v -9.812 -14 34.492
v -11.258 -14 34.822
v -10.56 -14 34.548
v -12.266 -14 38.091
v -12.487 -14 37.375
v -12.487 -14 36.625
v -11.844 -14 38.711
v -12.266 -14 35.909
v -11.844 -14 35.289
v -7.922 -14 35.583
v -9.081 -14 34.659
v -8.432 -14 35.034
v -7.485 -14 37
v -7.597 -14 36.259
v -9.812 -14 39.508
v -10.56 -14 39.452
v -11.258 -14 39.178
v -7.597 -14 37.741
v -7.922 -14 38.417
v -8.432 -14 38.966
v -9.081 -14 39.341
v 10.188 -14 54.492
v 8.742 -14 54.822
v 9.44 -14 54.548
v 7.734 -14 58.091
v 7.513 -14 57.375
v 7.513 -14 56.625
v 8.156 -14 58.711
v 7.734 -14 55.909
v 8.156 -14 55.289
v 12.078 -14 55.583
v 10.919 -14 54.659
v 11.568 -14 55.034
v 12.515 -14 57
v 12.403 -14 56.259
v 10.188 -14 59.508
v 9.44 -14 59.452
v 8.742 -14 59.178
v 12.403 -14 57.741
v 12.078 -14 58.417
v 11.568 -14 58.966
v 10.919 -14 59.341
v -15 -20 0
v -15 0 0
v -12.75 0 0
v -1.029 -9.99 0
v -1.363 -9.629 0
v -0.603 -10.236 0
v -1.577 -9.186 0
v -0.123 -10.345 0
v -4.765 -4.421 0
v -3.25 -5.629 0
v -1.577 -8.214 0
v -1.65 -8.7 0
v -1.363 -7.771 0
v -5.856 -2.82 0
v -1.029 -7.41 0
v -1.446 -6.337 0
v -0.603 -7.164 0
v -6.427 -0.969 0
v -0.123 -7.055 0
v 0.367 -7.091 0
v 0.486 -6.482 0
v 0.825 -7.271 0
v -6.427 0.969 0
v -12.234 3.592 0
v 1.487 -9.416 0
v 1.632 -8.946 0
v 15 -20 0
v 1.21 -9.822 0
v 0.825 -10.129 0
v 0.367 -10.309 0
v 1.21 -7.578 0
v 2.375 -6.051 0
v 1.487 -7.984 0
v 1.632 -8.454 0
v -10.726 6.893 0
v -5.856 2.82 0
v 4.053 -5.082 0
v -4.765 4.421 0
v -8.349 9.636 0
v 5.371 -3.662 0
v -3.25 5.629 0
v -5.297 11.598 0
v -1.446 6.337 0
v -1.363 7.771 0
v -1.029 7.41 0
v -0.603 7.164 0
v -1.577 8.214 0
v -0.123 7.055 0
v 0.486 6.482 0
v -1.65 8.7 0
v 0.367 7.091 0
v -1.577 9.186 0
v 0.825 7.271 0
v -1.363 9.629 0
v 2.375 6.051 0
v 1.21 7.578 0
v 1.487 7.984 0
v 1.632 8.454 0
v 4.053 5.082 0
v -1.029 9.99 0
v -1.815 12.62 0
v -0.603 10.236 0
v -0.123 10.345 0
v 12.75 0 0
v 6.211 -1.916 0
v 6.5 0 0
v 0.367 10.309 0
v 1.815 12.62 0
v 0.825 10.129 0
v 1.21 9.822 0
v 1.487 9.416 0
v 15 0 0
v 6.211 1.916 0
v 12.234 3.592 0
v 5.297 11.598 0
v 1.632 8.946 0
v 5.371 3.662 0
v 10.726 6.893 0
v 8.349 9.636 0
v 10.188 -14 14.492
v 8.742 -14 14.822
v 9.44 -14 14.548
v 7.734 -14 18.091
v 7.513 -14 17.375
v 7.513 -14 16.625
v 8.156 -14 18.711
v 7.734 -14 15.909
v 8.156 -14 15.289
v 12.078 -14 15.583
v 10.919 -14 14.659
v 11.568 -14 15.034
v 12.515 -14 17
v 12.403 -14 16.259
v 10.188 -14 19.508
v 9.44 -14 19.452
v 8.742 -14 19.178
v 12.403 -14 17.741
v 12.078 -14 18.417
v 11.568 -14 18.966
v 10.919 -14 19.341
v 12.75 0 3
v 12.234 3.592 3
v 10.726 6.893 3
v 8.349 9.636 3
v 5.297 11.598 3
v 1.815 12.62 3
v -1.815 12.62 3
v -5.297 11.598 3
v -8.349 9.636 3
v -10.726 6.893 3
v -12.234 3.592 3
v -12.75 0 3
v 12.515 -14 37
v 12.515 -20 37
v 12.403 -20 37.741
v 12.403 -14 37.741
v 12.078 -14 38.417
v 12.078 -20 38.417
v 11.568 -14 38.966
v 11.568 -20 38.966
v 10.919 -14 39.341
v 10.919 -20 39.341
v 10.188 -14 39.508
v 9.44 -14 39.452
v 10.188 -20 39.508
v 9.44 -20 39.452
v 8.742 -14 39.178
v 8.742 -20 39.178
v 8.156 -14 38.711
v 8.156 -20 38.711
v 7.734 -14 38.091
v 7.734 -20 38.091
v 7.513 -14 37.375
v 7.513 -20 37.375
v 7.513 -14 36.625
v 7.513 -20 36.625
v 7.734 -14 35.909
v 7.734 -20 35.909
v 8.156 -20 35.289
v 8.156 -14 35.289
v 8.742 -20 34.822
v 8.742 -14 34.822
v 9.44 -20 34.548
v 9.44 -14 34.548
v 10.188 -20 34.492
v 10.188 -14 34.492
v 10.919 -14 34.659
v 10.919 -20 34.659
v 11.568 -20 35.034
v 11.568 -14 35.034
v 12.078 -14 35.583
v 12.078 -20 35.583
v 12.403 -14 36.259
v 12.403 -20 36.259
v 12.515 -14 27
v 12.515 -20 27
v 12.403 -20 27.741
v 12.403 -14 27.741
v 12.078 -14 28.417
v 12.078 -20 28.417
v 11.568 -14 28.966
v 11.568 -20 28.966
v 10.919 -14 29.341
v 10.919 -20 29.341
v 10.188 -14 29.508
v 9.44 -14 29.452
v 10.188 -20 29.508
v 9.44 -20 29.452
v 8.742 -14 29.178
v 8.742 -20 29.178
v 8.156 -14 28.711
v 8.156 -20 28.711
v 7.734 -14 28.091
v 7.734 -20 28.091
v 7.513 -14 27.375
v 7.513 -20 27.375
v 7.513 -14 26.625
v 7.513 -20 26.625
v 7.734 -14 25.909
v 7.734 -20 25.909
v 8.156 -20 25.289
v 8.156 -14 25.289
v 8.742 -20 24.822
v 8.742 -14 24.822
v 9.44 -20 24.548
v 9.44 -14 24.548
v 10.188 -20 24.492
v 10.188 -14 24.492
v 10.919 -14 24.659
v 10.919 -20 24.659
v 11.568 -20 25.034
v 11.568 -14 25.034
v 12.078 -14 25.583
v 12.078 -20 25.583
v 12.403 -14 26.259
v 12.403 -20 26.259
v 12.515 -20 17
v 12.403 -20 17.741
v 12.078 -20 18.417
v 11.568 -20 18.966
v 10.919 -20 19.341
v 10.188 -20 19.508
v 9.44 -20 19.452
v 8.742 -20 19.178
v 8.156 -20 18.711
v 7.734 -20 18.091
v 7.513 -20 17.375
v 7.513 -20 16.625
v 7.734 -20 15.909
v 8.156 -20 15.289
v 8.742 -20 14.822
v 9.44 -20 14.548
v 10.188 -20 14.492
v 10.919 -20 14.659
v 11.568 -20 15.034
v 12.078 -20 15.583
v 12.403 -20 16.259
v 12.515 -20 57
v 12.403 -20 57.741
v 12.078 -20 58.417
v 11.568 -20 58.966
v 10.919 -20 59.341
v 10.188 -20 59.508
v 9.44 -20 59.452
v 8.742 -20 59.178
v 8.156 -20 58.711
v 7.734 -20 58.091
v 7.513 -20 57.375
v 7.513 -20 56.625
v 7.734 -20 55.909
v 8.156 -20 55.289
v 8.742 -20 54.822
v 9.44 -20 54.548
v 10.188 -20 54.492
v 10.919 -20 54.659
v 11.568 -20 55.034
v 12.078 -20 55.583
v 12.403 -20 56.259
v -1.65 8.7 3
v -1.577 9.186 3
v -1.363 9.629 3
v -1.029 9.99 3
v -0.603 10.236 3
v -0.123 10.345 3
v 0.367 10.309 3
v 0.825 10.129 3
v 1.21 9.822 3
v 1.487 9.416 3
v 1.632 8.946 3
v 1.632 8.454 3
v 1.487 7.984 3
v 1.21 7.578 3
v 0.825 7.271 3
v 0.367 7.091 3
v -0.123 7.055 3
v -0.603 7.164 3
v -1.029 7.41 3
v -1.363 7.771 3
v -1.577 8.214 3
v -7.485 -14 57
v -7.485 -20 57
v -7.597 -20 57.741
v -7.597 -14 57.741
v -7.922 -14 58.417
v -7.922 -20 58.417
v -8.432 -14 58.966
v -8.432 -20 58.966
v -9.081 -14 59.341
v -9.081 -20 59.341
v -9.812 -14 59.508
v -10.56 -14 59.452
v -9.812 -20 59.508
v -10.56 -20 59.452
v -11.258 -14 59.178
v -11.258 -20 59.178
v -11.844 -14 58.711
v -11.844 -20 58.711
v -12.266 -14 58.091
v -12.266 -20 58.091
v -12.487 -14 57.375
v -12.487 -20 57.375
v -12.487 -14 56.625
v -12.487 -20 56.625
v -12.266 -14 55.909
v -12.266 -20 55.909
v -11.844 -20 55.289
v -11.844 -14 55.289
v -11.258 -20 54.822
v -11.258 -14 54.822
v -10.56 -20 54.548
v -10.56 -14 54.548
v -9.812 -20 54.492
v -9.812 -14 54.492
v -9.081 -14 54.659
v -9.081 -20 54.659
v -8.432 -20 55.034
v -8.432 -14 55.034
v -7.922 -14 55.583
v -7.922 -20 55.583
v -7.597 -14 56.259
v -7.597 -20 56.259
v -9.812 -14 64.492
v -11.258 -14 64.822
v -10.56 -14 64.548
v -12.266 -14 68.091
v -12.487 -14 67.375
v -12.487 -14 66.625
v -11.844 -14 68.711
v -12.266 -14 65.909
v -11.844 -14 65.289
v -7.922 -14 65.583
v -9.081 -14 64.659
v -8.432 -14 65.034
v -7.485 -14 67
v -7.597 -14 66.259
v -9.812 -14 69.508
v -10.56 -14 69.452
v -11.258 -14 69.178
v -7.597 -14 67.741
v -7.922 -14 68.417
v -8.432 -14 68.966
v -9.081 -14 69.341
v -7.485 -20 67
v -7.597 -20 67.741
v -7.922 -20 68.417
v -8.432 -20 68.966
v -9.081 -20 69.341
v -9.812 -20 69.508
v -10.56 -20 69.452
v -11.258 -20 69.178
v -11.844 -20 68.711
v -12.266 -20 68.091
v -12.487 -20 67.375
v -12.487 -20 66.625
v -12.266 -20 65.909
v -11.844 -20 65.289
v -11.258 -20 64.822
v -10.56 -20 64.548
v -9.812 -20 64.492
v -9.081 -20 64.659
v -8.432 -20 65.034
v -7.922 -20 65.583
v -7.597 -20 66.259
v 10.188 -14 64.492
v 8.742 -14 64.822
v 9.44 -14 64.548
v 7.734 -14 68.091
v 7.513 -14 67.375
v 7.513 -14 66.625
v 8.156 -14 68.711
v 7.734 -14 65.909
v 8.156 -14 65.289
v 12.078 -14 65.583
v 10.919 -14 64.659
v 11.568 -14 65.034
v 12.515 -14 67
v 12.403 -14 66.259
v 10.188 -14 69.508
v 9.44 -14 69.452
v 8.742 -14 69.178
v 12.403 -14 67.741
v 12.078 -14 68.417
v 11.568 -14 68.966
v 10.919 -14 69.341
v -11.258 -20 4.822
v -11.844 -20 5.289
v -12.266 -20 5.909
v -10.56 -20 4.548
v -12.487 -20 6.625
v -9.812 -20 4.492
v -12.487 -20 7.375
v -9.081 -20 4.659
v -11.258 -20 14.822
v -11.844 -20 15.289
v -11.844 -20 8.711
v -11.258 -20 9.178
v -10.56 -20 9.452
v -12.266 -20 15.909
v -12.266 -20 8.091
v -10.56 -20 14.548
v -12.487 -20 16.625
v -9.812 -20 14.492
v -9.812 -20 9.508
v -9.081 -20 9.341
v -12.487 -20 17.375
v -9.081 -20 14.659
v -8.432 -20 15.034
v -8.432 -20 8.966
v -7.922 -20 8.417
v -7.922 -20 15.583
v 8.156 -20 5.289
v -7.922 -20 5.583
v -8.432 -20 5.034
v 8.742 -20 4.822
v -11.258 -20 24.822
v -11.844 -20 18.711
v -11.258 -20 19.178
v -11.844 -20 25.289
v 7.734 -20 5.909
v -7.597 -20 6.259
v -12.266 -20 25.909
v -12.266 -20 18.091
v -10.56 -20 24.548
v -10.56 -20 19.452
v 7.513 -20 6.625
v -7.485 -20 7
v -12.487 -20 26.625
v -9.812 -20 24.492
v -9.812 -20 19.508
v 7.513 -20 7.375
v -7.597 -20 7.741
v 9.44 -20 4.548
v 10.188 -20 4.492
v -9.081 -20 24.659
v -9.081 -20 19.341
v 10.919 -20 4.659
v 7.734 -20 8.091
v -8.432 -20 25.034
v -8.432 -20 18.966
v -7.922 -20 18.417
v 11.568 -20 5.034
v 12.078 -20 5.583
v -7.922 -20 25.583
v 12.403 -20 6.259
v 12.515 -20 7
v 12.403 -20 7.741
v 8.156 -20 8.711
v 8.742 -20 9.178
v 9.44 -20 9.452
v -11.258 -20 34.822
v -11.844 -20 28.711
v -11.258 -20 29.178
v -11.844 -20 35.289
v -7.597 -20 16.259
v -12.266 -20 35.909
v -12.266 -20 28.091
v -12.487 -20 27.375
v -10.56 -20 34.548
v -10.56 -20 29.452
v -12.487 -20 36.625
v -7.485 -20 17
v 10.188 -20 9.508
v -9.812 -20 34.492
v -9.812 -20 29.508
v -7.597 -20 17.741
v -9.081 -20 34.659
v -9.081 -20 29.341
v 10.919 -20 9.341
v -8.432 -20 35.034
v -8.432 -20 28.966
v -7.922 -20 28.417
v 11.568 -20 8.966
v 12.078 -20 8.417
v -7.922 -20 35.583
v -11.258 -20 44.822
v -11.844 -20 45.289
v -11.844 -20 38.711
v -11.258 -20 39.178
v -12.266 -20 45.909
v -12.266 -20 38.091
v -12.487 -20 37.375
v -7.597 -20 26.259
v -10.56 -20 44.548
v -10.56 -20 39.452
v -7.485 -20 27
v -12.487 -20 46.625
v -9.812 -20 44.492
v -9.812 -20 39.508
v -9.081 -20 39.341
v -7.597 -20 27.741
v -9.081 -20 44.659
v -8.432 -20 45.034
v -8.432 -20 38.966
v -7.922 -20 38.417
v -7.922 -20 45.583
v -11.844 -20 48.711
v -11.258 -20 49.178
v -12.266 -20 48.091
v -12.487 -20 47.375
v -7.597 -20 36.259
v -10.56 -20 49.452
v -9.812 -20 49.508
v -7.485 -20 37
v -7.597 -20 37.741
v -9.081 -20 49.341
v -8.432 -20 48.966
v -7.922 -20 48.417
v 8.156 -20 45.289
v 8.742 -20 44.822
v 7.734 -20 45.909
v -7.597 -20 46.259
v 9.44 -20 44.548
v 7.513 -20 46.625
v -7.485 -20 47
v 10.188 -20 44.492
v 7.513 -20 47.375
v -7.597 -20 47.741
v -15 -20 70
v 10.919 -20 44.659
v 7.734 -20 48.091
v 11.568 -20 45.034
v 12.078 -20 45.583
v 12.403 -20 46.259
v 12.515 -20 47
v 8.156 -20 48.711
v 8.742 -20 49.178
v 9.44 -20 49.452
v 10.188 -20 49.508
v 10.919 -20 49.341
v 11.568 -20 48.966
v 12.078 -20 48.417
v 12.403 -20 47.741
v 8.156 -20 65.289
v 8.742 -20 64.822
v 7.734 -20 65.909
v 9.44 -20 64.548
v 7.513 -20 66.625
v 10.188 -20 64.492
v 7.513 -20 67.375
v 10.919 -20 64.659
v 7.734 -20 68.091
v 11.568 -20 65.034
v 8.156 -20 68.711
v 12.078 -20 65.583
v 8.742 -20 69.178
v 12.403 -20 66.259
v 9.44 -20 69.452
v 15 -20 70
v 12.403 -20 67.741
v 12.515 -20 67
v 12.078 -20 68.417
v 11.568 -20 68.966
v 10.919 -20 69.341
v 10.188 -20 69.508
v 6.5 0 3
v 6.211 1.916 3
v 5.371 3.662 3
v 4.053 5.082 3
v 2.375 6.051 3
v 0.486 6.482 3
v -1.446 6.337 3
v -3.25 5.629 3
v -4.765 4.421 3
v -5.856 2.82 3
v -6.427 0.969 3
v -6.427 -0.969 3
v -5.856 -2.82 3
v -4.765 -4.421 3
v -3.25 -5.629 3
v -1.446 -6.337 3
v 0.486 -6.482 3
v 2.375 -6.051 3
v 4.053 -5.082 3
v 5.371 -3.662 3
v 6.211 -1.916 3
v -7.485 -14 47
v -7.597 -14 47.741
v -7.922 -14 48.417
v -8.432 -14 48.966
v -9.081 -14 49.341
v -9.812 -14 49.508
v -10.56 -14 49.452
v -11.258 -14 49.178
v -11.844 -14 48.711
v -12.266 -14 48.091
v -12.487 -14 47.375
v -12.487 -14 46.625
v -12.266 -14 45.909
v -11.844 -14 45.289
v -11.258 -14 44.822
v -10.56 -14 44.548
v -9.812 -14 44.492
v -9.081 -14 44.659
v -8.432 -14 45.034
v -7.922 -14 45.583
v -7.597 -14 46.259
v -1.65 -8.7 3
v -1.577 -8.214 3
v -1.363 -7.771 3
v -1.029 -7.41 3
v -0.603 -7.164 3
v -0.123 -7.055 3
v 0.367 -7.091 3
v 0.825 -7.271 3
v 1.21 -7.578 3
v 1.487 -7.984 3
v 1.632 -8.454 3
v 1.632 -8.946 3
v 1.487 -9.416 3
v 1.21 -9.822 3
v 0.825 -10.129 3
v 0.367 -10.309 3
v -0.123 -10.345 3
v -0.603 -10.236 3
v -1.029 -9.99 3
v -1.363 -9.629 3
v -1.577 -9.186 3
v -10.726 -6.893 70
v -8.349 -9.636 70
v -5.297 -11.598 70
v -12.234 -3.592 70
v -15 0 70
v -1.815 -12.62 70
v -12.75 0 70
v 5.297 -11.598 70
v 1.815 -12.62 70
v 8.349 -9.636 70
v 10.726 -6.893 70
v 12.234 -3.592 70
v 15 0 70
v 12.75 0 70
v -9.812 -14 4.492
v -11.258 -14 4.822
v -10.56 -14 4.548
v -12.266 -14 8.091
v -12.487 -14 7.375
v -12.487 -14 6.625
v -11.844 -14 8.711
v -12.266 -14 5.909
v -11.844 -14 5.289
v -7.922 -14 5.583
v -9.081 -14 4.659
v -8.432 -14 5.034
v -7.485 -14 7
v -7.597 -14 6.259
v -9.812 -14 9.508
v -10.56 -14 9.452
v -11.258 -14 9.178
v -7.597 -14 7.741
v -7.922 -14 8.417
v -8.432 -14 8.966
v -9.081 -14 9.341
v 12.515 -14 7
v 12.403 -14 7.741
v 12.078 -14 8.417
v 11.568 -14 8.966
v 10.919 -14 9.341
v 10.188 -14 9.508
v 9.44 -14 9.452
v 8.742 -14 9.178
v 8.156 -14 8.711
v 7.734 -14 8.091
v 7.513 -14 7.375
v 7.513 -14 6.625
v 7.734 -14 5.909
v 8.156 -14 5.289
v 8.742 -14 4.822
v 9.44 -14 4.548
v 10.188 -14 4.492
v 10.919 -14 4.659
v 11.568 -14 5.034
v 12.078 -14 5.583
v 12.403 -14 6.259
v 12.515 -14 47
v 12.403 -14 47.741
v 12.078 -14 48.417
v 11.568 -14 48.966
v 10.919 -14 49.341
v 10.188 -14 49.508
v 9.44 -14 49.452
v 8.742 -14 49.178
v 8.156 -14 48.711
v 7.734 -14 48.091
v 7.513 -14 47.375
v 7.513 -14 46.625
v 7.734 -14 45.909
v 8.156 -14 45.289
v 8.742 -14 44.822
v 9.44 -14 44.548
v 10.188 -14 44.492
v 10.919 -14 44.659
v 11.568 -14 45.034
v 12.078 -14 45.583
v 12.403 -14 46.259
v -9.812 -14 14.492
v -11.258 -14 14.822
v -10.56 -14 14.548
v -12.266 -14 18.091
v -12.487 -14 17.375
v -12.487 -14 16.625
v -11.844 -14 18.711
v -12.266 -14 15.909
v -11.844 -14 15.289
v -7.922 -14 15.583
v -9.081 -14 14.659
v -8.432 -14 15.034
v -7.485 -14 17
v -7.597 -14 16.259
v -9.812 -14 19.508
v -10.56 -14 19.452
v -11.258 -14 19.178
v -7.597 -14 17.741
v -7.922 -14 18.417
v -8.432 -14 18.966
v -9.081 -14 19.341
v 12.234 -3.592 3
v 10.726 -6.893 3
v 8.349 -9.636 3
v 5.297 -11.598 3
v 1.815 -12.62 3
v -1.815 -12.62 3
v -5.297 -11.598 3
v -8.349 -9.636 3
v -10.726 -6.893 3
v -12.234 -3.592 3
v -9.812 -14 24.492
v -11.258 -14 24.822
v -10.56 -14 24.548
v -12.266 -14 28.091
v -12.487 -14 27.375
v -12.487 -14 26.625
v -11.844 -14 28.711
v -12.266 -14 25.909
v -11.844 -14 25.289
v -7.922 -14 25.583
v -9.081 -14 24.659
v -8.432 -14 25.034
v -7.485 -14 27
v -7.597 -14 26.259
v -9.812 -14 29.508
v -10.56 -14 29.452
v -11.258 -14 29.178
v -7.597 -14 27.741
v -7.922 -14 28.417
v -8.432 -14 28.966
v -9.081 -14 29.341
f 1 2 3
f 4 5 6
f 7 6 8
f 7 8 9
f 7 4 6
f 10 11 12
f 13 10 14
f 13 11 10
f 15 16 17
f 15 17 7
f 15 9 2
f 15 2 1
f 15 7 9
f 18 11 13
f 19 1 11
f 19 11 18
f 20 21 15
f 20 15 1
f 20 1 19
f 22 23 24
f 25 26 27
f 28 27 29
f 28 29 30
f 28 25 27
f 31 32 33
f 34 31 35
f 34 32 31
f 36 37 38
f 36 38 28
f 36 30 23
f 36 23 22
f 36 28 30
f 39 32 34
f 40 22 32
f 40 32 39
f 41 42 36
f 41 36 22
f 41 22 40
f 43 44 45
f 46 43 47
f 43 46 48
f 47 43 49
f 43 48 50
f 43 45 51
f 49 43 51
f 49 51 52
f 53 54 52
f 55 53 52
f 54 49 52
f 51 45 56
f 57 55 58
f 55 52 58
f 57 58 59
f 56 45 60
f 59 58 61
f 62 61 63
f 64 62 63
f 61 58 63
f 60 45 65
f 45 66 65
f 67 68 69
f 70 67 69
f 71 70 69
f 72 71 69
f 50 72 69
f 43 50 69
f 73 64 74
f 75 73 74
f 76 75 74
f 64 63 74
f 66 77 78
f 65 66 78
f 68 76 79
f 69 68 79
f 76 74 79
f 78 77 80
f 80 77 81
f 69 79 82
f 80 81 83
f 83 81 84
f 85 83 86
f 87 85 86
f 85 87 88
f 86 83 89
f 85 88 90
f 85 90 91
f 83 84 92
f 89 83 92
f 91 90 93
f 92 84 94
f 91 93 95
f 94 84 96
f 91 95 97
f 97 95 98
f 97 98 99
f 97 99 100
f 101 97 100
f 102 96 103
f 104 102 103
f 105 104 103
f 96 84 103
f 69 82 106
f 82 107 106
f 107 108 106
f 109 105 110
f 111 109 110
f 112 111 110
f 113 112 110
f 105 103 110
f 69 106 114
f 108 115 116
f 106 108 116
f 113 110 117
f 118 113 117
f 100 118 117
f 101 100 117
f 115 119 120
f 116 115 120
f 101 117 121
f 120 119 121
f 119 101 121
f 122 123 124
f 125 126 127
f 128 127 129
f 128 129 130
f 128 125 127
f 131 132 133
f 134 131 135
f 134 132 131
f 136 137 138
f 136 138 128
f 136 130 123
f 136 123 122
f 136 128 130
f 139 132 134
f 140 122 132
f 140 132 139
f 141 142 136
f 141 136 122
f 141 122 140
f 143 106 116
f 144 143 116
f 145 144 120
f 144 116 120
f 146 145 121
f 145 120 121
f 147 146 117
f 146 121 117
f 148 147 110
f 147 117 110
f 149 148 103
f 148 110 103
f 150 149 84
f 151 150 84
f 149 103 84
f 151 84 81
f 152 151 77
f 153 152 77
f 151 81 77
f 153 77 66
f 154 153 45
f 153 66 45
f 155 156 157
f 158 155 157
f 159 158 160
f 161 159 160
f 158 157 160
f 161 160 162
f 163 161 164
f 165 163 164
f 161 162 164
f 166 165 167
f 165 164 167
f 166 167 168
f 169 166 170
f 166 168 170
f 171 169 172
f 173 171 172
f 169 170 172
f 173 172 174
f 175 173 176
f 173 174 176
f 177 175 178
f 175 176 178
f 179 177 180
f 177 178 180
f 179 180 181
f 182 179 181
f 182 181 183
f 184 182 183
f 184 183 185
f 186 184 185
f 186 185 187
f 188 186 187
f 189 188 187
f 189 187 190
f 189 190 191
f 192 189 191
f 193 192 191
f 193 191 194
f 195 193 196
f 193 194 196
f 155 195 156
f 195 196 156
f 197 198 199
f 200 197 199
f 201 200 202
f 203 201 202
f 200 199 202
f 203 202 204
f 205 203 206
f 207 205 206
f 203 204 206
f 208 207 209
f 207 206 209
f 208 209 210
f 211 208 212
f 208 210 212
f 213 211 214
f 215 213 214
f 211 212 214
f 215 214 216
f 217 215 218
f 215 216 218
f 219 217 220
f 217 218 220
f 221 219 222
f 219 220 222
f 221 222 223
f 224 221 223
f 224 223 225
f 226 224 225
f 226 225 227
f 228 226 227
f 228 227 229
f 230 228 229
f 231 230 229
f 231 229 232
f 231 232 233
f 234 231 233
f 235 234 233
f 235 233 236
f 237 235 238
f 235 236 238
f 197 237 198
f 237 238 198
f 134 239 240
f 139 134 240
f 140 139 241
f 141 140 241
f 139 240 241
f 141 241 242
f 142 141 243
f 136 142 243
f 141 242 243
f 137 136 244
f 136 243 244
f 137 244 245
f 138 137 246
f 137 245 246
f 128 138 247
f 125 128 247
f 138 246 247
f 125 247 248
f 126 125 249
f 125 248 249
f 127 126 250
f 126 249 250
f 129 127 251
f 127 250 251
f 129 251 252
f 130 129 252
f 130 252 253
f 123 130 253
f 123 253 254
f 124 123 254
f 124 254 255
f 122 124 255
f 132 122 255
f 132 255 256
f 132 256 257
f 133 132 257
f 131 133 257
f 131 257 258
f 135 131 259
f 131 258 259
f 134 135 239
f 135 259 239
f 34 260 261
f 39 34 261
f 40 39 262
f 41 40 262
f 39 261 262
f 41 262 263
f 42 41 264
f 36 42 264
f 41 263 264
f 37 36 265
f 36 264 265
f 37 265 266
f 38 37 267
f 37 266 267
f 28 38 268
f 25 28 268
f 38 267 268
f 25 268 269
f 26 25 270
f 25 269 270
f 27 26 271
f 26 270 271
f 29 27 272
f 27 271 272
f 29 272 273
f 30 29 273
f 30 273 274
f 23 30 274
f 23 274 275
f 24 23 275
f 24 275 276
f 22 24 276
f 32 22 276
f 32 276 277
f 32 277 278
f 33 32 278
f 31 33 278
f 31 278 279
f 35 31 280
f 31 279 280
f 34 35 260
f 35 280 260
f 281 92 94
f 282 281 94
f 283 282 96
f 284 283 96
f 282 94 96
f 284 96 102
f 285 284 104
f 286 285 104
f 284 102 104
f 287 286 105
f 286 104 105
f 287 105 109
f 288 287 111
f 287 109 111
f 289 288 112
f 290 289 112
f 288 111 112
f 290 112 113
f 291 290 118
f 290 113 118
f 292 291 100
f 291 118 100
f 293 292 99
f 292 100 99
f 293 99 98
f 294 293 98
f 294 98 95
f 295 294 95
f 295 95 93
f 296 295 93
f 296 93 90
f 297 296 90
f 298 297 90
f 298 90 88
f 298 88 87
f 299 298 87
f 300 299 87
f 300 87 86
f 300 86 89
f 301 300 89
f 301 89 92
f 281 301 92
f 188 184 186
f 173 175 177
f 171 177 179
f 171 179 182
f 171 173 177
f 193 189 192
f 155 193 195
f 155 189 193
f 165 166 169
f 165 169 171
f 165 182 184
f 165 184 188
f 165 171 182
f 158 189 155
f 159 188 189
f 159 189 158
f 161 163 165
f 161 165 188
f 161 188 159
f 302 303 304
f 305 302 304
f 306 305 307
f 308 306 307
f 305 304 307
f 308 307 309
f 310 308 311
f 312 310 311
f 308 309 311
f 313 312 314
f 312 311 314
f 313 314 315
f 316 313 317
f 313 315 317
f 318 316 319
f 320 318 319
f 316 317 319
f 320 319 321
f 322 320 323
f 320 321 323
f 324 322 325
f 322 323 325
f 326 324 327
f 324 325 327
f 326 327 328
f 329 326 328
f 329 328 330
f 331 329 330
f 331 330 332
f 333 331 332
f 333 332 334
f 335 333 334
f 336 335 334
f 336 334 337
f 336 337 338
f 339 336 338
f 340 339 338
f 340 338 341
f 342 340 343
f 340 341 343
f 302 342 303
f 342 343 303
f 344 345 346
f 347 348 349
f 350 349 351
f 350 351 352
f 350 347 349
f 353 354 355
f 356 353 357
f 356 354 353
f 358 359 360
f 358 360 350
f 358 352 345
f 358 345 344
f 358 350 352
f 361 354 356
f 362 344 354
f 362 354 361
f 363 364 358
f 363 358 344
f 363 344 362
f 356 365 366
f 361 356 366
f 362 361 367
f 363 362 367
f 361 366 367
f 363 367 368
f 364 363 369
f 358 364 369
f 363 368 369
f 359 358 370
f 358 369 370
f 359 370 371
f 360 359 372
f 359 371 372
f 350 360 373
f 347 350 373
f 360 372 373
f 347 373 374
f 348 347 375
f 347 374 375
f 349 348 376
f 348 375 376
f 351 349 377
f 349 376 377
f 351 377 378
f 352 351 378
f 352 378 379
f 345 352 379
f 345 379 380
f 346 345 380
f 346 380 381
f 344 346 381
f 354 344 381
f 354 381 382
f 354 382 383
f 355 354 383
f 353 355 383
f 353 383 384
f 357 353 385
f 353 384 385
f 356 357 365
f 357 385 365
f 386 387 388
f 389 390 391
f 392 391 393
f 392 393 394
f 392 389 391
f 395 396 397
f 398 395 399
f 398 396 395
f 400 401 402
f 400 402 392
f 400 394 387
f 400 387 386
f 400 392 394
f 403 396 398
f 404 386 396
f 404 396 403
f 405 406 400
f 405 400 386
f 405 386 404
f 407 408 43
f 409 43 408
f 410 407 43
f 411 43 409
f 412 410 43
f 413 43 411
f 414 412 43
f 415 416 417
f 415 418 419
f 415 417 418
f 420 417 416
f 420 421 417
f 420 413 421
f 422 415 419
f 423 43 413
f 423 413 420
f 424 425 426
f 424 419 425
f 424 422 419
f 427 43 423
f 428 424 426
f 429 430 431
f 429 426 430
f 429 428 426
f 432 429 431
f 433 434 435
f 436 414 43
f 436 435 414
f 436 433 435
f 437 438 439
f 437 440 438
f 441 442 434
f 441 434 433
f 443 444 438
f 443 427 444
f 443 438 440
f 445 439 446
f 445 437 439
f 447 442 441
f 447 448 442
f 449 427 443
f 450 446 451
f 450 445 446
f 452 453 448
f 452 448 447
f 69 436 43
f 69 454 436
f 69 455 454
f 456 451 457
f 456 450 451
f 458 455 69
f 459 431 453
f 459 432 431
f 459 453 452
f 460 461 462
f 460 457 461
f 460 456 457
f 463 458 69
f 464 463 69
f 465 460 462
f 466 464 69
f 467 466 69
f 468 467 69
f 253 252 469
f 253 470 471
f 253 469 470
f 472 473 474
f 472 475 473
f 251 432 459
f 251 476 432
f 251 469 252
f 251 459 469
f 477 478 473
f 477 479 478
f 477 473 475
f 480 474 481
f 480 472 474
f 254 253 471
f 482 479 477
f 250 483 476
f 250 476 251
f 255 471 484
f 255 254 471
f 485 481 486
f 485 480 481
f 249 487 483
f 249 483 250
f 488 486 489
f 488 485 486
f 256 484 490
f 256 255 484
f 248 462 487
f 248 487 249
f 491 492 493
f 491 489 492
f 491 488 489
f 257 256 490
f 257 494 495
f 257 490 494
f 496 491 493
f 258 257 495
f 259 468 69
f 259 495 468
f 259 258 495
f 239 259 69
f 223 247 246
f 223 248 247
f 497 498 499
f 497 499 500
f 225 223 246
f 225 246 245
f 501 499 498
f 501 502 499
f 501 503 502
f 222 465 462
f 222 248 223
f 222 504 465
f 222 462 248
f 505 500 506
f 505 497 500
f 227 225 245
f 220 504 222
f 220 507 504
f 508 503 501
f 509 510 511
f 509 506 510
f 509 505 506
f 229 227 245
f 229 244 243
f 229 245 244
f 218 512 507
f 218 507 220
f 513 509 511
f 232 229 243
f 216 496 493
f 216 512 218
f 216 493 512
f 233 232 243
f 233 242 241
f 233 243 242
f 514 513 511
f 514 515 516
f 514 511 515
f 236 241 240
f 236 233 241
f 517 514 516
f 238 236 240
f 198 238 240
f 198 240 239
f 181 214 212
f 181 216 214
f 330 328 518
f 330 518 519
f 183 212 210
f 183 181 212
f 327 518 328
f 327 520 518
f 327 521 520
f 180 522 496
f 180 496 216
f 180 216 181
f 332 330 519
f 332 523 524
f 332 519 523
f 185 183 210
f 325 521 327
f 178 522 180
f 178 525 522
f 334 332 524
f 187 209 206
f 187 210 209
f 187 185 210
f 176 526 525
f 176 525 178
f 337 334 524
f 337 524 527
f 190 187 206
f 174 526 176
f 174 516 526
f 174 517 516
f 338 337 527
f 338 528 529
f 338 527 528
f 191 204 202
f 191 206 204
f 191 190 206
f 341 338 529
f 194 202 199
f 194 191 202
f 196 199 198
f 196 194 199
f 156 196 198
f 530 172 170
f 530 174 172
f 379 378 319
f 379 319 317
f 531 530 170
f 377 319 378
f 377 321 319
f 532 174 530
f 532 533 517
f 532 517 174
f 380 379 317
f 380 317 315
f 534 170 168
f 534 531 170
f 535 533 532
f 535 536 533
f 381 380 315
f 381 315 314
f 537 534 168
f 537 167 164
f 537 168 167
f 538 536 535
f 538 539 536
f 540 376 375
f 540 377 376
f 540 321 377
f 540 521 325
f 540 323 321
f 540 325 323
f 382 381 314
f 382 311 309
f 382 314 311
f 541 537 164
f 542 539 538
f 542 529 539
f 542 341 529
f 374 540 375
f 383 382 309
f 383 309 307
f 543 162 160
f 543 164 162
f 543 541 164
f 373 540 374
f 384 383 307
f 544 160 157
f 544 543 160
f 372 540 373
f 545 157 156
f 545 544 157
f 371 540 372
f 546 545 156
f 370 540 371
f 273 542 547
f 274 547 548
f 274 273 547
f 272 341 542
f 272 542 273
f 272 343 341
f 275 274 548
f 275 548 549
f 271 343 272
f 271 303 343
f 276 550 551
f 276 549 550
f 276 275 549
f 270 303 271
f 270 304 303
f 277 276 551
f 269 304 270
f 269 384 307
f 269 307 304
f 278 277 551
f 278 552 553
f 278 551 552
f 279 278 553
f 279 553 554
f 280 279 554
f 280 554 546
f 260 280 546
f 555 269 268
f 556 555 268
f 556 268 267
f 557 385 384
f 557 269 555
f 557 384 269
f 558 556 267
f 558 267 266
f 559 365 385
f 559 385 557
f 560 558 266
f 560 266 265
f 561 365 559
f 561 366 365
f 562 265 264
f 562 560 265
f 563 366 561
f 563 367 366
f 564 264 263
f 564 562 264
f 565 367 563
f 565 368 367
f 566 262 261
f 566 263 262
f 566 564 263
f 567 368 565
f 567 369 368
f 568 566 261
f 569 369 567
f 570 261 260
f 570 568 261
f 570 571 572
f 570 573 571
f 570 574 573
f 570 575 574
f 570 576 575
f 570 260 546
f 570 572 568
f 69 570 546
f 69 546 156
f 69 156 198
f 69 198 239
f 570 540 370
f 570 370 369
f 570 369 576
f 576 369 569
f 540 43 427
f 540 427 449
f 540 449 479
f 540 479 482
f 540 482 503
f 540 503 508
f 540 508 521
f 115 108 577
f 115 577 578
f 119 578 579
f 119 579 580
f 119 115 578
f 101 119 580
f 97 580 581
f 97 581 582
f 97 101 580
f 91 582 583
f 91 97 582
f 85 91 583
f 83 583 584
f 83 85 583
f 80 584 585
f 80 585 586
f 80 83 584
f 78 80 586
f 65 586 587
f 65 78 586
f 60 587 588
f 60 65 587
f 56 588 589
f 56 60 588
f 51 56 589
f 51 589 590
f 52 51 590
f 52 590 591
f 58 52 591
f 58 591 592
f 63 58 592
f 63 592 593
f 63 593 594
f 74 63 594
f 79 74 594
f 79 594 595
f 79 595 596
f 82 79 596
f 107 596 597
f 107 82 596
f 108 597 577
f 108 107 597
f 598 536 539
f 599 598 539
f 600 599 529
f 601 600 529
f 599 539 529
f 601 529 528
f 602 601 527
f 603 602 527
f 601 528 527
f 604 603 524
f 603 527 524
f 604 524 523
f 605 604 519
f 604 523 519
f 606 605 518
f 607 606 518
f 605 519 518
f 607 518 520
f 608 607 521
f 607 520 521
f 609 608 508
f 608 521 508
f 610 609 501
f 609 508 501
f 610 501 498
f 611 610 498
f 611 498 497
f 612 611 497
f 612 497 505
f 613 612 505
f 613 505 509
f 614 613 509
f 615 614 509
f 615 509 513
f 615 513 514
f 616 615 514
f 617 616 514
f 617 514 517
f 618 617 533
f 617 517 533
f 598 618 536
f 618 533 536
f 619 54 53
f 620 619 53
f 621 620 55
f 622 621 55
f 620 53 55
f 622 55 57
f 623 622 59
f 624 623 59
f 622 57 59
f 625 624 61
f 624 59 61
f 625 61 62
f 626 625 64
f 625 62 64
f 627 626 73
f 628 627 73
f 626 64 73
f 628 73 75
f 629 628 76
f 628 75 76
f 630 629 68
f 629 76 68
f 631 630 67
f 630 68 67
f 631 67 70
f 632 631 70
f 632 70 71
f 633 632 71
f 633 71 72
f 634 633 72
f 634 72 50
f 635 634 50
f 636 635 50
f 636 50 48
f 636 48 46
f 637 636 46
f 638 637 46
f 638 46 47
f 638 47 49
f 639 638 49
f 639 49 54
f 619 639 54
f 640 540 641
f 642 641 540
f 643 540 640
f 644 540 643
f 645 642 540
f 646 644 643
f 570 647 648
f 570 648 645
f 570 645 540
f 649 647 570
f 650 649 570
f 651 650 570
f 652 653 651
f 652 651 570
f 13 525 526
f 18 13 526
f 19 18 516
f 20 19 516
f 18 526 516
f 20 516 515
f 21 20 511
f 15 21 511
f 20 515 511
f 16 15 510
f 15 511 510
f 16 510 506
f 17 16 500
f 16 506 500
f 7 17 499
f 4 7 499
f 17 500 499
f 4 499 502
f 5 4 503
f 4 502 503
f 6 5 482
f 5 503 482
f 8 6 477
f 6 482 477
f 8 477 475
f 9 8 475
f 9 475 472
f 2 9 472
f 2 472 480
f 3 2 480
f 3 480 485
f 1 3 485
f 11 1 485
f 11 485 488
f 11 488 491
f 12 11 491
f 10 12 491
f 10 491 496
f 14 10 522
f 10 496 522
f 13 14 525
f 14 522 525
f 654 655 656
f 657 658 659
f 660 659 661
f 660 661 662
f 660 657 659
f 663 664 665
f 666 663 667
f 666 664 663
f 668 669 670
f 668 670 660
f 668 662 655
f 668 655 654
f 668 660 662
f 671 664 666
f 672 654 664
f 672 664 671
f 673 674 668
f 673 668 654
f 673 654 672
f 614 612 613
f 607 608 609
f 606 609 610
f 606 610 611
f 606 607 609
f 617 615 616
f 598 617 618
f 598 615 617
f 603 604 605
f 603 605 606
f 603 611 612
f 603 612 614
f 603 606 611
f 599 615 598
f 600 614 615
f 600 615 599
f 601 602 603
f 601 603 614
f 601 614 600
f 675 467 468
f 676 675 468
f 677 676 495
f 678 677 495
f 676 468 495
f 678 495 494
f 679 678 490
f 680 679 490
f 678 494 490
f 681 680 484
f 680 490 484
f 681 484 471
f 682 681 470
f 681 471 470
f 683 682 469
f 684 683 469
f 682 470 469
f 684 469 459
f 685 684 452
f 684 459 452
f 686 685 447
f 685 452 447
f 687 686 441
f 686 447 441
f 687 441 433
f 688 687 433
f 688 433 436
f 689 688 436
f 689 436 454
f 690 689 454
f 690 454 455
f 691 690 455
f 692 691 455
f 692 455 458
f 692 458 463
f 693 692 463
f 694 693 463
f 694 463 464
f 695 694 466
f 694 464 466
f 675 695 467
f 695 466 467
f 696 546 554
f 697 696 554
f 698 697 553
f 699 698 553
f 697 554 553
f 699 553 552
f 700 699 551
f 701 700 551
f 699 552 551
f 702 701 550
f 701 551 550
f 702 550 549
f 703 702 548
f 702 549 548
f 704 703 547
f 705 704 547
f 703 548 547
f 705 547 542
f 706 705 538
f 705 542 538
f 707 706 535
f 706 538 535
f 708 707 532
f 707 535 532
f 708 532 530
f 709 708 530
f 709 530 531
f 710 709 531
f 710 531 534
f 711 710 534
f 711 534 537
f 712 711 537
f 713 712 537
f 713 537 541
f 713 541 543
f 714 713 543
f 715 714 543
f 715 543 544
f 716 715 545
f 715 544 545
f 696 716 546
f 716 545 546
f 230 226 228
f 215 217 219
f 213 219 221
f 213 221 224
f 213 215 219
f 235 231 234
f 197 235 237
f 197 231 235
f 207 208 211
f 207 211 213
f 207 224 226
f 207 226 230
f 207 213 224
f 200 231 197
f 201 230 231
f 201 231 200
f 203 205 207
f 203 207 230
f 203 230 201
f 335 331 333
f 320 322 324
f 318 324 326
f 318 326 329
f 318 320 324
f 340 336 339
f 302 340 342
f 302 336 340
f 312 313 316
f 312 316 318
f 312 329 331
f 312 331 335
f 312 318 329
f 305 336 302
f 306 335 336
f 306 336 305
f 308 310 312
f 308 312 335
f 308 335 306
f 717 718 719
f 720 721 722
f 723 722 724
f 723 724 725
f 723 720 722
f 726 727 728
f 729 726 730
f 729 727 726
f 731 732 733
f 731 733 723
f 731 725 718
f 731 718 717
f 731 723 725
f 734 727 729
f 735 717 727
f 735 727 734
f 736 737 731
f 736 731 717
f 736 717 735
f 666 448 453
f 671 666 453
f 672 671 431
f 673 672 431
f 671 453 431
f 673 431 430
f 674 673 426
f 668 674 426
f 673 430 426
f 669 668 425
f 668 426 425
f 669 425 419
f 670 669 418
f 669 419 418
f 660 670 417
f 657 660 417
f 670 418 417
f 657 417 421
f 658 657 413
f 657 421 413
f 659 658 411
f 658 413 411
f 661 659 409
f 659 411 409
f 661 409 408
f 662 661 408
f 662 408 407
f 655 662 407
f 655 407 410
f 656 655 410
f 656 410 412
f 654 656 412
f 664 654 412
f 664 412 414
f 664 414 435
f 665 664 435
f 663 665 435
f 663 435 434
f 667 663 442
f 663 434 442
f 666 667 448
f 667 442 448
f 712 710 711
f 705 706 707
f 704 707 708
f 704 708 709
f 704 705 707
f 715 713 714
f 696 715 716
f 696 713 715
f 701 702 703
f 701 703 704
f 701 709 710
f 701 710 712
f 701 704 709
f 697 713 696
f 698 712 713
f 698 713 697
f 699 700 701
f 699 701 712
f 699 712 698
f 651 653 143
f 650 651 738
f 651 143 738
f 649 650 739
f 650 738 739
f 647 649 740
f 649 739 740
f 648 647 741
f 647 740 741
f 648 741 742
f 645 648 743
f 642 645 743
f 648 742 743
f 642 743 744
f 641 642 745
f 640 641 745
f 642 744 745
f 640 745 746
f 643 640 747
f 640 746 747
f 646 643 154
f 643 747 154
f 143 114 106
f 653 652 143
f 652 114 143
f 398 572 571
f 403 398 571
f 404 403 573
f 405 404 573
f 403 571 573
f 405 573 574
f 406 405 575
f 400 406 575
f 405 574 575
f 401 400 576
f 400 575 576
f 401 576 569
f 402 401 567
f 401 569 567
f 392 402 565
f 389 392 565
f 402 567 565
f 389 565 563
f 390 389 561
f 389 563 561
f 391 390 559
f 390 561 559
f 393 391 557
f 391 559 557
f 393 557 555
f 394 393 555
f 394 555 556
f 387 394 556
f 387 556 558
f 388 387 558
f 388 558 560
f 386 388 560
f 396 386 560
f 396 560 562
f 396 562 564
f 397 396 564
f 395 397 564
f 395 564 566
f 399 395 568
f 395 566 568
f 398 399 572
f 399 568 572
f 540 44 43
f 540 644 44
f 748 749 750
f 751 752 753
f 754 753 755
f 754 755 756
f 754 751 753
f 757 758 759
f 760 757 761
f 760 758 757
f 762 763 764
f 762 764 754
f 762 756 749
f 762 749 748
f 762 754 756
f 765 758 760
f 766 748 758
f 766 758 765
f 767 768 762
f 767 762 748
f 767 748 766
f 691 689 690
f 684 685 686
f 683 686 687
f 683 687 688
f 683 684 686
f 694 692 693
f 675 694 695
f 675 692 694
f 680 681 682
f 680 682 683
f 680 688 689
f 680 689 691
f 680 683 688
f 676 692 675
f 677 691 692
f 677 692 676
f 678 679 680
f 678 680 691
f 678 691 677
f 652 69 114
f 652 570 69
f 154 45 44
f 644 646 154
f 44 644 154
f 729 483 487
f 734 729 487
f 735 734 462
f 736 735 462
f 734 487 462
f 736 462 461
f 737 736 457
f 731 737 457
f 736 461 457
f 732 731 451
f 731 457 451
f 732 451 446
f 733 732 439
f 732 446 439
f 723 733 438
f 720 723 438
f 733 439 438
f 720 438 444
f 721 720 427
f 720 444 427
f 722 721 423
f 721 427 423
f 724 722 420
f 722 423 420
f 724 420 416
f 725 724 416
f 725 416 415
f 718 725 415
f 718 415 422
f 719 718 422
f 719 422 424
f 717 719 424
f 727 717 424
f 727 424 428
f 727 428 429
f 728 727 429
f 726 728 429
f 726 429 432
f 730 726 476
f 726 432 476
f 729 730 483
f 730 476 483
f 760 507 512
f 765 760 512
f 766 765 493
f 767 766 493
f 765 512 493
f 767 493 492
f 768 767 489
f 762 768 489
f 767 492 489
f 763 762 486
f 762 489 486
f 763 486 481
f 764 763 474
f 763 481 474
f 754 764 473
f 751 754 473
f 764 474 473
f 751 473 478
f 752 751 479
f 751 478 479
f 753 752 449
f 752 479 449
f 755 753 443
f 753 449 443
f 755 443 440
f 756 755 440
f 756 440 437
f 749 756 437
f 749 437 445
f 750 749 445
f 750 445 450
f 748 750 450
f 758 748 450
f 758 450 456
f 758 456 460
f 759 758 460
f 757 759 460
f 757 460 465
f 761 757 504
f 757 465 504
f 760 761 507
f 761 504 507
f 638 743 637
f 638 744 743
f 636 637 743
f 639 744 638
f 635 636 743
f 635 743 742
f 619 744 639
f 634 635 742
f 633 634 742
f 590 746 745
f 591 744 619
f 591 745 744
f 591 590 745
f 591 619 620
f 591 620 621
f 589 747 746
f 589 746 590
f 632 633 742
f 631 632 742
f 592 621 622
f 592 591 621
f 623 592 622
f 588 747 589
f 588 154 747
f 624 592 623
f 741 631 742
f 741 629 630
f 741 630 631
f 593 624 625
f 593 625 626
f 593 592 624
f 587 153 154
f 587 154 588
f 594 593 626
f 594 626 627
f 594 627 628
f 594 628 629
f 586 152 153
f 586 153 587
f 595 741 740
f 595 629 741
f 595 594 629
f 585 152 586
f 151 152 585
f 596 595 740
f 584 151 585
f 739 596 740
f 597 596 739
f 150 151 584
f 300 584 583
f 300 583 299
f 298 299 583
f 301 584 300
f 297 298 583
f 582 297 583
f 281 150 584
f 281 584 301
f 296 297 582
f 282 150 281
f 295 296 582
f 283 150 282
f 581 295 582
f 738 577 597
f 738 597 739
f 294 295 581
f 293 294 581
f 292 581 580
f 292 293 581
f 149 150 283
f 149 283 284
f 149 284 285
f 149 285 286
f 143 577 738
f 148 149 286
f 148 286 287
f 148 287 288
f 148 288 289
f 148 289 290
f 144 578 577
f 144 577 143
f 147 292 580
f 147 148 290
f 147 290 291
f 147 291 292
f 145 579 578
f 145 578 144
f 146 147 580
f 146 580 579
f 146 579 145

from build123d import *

# Parameters (mm, degrees)
SKETCH1_R                = 12.75
SKETCH1_R_2              = 6.5
BOSS_EXTRUDE1_DEPTH      = 3
BOSS_EXTRUDE2_DEPTH      = 67
BOSS_EXTRUDE2_DEPTH_BACK = 3
SKETCH4_R                = 2.515
CUT_EXTRUDE1_DEPTH       = 6
LPATTERN1_COUNT          = 2
LPATTERN1_PITCH          = 20
LPATTERN1_COUNT_DIR2     = 7
LPATTERN1_PITCH_DIR2     = 10
SKETCH5_R                = 1.65
CUT_EXTRUDE2_DEPTH       = 75


with BuildPart() as part:
    # Sketch1 → Boss-Extrude1 (new body)
    with BuildSketch(Plane.XY):
        Circle(SKETCH1_R)
        Circle(SKETCH1_R_2, mode=Mode.SUBTRACT)
    extrude(amount=BOSS_EXTRUDE1_DEPTH)

    # Sketch2 → Boss-Extrude2 (add, two sides)
    with BuildSketch(Plane.XY.offset(3)) as boss_extrude2_sk:
        with BuildLine():
            Line((15, -20), (15, 0))
            Line((15, 0), (12.75, 0))
            ThreePointArc((12.75, 0), (0, -12.75), (-12.75, 0))
            Line((-12.75, 0), (-15, 0))
            Line((-15, 0), (-15, -20))
            Line((-15, -20), (15, -20))
        make_face()
    extrude(amount=BOSS_EXTRUDE2_DEPTH)
    extrude(boss_extrude2_sk.sketch, amount=-BOSS_EXTRUDE2_DEPTH_BACK)

    # Sketch4 → Cut-Extrude1 (cut)
    with BuildSketch(Plane.XZ.offset(20)):
        with Locations((-10, 67)):
            Circle(SKETCH4_R)
    cut_extrude1 = extrude(amount=-CUT_EXTRUDE1_DEPTH, mode=Mode.SUBTRACT)

    # LPattern1: Cut-Extrude1 2 × 7
    with Locations(*[(i * LPATTERN1_PITCH, 0, -j * LPATTERN1_PITCH_DIR2) for i in range(LPATTERN1_COUNT) for j in range(LPATTERN1_COUNT_DIR2) if (i, j) != (0, 0)]):
        add(cut_extrude1, mode=Mode.SUBTRACT)

    # Sketch5 → Cut-Extrude2 (cut)
    with BuildSketch(Plane(origin=(0, 0, 0), x_dir=(-1, 0, 0), z_dir=(0, 0, -1))):
        with Locations((0, 8.7)):
            Circle(SKETCH5_R)
        with Locations((0, -8.7)):
            Circle(SKETCH5_R)
    extrude(amount=-CUT_EXTRUDE2_DEPTH, mode=Mode.SUBTRACT)


solid = part.part
